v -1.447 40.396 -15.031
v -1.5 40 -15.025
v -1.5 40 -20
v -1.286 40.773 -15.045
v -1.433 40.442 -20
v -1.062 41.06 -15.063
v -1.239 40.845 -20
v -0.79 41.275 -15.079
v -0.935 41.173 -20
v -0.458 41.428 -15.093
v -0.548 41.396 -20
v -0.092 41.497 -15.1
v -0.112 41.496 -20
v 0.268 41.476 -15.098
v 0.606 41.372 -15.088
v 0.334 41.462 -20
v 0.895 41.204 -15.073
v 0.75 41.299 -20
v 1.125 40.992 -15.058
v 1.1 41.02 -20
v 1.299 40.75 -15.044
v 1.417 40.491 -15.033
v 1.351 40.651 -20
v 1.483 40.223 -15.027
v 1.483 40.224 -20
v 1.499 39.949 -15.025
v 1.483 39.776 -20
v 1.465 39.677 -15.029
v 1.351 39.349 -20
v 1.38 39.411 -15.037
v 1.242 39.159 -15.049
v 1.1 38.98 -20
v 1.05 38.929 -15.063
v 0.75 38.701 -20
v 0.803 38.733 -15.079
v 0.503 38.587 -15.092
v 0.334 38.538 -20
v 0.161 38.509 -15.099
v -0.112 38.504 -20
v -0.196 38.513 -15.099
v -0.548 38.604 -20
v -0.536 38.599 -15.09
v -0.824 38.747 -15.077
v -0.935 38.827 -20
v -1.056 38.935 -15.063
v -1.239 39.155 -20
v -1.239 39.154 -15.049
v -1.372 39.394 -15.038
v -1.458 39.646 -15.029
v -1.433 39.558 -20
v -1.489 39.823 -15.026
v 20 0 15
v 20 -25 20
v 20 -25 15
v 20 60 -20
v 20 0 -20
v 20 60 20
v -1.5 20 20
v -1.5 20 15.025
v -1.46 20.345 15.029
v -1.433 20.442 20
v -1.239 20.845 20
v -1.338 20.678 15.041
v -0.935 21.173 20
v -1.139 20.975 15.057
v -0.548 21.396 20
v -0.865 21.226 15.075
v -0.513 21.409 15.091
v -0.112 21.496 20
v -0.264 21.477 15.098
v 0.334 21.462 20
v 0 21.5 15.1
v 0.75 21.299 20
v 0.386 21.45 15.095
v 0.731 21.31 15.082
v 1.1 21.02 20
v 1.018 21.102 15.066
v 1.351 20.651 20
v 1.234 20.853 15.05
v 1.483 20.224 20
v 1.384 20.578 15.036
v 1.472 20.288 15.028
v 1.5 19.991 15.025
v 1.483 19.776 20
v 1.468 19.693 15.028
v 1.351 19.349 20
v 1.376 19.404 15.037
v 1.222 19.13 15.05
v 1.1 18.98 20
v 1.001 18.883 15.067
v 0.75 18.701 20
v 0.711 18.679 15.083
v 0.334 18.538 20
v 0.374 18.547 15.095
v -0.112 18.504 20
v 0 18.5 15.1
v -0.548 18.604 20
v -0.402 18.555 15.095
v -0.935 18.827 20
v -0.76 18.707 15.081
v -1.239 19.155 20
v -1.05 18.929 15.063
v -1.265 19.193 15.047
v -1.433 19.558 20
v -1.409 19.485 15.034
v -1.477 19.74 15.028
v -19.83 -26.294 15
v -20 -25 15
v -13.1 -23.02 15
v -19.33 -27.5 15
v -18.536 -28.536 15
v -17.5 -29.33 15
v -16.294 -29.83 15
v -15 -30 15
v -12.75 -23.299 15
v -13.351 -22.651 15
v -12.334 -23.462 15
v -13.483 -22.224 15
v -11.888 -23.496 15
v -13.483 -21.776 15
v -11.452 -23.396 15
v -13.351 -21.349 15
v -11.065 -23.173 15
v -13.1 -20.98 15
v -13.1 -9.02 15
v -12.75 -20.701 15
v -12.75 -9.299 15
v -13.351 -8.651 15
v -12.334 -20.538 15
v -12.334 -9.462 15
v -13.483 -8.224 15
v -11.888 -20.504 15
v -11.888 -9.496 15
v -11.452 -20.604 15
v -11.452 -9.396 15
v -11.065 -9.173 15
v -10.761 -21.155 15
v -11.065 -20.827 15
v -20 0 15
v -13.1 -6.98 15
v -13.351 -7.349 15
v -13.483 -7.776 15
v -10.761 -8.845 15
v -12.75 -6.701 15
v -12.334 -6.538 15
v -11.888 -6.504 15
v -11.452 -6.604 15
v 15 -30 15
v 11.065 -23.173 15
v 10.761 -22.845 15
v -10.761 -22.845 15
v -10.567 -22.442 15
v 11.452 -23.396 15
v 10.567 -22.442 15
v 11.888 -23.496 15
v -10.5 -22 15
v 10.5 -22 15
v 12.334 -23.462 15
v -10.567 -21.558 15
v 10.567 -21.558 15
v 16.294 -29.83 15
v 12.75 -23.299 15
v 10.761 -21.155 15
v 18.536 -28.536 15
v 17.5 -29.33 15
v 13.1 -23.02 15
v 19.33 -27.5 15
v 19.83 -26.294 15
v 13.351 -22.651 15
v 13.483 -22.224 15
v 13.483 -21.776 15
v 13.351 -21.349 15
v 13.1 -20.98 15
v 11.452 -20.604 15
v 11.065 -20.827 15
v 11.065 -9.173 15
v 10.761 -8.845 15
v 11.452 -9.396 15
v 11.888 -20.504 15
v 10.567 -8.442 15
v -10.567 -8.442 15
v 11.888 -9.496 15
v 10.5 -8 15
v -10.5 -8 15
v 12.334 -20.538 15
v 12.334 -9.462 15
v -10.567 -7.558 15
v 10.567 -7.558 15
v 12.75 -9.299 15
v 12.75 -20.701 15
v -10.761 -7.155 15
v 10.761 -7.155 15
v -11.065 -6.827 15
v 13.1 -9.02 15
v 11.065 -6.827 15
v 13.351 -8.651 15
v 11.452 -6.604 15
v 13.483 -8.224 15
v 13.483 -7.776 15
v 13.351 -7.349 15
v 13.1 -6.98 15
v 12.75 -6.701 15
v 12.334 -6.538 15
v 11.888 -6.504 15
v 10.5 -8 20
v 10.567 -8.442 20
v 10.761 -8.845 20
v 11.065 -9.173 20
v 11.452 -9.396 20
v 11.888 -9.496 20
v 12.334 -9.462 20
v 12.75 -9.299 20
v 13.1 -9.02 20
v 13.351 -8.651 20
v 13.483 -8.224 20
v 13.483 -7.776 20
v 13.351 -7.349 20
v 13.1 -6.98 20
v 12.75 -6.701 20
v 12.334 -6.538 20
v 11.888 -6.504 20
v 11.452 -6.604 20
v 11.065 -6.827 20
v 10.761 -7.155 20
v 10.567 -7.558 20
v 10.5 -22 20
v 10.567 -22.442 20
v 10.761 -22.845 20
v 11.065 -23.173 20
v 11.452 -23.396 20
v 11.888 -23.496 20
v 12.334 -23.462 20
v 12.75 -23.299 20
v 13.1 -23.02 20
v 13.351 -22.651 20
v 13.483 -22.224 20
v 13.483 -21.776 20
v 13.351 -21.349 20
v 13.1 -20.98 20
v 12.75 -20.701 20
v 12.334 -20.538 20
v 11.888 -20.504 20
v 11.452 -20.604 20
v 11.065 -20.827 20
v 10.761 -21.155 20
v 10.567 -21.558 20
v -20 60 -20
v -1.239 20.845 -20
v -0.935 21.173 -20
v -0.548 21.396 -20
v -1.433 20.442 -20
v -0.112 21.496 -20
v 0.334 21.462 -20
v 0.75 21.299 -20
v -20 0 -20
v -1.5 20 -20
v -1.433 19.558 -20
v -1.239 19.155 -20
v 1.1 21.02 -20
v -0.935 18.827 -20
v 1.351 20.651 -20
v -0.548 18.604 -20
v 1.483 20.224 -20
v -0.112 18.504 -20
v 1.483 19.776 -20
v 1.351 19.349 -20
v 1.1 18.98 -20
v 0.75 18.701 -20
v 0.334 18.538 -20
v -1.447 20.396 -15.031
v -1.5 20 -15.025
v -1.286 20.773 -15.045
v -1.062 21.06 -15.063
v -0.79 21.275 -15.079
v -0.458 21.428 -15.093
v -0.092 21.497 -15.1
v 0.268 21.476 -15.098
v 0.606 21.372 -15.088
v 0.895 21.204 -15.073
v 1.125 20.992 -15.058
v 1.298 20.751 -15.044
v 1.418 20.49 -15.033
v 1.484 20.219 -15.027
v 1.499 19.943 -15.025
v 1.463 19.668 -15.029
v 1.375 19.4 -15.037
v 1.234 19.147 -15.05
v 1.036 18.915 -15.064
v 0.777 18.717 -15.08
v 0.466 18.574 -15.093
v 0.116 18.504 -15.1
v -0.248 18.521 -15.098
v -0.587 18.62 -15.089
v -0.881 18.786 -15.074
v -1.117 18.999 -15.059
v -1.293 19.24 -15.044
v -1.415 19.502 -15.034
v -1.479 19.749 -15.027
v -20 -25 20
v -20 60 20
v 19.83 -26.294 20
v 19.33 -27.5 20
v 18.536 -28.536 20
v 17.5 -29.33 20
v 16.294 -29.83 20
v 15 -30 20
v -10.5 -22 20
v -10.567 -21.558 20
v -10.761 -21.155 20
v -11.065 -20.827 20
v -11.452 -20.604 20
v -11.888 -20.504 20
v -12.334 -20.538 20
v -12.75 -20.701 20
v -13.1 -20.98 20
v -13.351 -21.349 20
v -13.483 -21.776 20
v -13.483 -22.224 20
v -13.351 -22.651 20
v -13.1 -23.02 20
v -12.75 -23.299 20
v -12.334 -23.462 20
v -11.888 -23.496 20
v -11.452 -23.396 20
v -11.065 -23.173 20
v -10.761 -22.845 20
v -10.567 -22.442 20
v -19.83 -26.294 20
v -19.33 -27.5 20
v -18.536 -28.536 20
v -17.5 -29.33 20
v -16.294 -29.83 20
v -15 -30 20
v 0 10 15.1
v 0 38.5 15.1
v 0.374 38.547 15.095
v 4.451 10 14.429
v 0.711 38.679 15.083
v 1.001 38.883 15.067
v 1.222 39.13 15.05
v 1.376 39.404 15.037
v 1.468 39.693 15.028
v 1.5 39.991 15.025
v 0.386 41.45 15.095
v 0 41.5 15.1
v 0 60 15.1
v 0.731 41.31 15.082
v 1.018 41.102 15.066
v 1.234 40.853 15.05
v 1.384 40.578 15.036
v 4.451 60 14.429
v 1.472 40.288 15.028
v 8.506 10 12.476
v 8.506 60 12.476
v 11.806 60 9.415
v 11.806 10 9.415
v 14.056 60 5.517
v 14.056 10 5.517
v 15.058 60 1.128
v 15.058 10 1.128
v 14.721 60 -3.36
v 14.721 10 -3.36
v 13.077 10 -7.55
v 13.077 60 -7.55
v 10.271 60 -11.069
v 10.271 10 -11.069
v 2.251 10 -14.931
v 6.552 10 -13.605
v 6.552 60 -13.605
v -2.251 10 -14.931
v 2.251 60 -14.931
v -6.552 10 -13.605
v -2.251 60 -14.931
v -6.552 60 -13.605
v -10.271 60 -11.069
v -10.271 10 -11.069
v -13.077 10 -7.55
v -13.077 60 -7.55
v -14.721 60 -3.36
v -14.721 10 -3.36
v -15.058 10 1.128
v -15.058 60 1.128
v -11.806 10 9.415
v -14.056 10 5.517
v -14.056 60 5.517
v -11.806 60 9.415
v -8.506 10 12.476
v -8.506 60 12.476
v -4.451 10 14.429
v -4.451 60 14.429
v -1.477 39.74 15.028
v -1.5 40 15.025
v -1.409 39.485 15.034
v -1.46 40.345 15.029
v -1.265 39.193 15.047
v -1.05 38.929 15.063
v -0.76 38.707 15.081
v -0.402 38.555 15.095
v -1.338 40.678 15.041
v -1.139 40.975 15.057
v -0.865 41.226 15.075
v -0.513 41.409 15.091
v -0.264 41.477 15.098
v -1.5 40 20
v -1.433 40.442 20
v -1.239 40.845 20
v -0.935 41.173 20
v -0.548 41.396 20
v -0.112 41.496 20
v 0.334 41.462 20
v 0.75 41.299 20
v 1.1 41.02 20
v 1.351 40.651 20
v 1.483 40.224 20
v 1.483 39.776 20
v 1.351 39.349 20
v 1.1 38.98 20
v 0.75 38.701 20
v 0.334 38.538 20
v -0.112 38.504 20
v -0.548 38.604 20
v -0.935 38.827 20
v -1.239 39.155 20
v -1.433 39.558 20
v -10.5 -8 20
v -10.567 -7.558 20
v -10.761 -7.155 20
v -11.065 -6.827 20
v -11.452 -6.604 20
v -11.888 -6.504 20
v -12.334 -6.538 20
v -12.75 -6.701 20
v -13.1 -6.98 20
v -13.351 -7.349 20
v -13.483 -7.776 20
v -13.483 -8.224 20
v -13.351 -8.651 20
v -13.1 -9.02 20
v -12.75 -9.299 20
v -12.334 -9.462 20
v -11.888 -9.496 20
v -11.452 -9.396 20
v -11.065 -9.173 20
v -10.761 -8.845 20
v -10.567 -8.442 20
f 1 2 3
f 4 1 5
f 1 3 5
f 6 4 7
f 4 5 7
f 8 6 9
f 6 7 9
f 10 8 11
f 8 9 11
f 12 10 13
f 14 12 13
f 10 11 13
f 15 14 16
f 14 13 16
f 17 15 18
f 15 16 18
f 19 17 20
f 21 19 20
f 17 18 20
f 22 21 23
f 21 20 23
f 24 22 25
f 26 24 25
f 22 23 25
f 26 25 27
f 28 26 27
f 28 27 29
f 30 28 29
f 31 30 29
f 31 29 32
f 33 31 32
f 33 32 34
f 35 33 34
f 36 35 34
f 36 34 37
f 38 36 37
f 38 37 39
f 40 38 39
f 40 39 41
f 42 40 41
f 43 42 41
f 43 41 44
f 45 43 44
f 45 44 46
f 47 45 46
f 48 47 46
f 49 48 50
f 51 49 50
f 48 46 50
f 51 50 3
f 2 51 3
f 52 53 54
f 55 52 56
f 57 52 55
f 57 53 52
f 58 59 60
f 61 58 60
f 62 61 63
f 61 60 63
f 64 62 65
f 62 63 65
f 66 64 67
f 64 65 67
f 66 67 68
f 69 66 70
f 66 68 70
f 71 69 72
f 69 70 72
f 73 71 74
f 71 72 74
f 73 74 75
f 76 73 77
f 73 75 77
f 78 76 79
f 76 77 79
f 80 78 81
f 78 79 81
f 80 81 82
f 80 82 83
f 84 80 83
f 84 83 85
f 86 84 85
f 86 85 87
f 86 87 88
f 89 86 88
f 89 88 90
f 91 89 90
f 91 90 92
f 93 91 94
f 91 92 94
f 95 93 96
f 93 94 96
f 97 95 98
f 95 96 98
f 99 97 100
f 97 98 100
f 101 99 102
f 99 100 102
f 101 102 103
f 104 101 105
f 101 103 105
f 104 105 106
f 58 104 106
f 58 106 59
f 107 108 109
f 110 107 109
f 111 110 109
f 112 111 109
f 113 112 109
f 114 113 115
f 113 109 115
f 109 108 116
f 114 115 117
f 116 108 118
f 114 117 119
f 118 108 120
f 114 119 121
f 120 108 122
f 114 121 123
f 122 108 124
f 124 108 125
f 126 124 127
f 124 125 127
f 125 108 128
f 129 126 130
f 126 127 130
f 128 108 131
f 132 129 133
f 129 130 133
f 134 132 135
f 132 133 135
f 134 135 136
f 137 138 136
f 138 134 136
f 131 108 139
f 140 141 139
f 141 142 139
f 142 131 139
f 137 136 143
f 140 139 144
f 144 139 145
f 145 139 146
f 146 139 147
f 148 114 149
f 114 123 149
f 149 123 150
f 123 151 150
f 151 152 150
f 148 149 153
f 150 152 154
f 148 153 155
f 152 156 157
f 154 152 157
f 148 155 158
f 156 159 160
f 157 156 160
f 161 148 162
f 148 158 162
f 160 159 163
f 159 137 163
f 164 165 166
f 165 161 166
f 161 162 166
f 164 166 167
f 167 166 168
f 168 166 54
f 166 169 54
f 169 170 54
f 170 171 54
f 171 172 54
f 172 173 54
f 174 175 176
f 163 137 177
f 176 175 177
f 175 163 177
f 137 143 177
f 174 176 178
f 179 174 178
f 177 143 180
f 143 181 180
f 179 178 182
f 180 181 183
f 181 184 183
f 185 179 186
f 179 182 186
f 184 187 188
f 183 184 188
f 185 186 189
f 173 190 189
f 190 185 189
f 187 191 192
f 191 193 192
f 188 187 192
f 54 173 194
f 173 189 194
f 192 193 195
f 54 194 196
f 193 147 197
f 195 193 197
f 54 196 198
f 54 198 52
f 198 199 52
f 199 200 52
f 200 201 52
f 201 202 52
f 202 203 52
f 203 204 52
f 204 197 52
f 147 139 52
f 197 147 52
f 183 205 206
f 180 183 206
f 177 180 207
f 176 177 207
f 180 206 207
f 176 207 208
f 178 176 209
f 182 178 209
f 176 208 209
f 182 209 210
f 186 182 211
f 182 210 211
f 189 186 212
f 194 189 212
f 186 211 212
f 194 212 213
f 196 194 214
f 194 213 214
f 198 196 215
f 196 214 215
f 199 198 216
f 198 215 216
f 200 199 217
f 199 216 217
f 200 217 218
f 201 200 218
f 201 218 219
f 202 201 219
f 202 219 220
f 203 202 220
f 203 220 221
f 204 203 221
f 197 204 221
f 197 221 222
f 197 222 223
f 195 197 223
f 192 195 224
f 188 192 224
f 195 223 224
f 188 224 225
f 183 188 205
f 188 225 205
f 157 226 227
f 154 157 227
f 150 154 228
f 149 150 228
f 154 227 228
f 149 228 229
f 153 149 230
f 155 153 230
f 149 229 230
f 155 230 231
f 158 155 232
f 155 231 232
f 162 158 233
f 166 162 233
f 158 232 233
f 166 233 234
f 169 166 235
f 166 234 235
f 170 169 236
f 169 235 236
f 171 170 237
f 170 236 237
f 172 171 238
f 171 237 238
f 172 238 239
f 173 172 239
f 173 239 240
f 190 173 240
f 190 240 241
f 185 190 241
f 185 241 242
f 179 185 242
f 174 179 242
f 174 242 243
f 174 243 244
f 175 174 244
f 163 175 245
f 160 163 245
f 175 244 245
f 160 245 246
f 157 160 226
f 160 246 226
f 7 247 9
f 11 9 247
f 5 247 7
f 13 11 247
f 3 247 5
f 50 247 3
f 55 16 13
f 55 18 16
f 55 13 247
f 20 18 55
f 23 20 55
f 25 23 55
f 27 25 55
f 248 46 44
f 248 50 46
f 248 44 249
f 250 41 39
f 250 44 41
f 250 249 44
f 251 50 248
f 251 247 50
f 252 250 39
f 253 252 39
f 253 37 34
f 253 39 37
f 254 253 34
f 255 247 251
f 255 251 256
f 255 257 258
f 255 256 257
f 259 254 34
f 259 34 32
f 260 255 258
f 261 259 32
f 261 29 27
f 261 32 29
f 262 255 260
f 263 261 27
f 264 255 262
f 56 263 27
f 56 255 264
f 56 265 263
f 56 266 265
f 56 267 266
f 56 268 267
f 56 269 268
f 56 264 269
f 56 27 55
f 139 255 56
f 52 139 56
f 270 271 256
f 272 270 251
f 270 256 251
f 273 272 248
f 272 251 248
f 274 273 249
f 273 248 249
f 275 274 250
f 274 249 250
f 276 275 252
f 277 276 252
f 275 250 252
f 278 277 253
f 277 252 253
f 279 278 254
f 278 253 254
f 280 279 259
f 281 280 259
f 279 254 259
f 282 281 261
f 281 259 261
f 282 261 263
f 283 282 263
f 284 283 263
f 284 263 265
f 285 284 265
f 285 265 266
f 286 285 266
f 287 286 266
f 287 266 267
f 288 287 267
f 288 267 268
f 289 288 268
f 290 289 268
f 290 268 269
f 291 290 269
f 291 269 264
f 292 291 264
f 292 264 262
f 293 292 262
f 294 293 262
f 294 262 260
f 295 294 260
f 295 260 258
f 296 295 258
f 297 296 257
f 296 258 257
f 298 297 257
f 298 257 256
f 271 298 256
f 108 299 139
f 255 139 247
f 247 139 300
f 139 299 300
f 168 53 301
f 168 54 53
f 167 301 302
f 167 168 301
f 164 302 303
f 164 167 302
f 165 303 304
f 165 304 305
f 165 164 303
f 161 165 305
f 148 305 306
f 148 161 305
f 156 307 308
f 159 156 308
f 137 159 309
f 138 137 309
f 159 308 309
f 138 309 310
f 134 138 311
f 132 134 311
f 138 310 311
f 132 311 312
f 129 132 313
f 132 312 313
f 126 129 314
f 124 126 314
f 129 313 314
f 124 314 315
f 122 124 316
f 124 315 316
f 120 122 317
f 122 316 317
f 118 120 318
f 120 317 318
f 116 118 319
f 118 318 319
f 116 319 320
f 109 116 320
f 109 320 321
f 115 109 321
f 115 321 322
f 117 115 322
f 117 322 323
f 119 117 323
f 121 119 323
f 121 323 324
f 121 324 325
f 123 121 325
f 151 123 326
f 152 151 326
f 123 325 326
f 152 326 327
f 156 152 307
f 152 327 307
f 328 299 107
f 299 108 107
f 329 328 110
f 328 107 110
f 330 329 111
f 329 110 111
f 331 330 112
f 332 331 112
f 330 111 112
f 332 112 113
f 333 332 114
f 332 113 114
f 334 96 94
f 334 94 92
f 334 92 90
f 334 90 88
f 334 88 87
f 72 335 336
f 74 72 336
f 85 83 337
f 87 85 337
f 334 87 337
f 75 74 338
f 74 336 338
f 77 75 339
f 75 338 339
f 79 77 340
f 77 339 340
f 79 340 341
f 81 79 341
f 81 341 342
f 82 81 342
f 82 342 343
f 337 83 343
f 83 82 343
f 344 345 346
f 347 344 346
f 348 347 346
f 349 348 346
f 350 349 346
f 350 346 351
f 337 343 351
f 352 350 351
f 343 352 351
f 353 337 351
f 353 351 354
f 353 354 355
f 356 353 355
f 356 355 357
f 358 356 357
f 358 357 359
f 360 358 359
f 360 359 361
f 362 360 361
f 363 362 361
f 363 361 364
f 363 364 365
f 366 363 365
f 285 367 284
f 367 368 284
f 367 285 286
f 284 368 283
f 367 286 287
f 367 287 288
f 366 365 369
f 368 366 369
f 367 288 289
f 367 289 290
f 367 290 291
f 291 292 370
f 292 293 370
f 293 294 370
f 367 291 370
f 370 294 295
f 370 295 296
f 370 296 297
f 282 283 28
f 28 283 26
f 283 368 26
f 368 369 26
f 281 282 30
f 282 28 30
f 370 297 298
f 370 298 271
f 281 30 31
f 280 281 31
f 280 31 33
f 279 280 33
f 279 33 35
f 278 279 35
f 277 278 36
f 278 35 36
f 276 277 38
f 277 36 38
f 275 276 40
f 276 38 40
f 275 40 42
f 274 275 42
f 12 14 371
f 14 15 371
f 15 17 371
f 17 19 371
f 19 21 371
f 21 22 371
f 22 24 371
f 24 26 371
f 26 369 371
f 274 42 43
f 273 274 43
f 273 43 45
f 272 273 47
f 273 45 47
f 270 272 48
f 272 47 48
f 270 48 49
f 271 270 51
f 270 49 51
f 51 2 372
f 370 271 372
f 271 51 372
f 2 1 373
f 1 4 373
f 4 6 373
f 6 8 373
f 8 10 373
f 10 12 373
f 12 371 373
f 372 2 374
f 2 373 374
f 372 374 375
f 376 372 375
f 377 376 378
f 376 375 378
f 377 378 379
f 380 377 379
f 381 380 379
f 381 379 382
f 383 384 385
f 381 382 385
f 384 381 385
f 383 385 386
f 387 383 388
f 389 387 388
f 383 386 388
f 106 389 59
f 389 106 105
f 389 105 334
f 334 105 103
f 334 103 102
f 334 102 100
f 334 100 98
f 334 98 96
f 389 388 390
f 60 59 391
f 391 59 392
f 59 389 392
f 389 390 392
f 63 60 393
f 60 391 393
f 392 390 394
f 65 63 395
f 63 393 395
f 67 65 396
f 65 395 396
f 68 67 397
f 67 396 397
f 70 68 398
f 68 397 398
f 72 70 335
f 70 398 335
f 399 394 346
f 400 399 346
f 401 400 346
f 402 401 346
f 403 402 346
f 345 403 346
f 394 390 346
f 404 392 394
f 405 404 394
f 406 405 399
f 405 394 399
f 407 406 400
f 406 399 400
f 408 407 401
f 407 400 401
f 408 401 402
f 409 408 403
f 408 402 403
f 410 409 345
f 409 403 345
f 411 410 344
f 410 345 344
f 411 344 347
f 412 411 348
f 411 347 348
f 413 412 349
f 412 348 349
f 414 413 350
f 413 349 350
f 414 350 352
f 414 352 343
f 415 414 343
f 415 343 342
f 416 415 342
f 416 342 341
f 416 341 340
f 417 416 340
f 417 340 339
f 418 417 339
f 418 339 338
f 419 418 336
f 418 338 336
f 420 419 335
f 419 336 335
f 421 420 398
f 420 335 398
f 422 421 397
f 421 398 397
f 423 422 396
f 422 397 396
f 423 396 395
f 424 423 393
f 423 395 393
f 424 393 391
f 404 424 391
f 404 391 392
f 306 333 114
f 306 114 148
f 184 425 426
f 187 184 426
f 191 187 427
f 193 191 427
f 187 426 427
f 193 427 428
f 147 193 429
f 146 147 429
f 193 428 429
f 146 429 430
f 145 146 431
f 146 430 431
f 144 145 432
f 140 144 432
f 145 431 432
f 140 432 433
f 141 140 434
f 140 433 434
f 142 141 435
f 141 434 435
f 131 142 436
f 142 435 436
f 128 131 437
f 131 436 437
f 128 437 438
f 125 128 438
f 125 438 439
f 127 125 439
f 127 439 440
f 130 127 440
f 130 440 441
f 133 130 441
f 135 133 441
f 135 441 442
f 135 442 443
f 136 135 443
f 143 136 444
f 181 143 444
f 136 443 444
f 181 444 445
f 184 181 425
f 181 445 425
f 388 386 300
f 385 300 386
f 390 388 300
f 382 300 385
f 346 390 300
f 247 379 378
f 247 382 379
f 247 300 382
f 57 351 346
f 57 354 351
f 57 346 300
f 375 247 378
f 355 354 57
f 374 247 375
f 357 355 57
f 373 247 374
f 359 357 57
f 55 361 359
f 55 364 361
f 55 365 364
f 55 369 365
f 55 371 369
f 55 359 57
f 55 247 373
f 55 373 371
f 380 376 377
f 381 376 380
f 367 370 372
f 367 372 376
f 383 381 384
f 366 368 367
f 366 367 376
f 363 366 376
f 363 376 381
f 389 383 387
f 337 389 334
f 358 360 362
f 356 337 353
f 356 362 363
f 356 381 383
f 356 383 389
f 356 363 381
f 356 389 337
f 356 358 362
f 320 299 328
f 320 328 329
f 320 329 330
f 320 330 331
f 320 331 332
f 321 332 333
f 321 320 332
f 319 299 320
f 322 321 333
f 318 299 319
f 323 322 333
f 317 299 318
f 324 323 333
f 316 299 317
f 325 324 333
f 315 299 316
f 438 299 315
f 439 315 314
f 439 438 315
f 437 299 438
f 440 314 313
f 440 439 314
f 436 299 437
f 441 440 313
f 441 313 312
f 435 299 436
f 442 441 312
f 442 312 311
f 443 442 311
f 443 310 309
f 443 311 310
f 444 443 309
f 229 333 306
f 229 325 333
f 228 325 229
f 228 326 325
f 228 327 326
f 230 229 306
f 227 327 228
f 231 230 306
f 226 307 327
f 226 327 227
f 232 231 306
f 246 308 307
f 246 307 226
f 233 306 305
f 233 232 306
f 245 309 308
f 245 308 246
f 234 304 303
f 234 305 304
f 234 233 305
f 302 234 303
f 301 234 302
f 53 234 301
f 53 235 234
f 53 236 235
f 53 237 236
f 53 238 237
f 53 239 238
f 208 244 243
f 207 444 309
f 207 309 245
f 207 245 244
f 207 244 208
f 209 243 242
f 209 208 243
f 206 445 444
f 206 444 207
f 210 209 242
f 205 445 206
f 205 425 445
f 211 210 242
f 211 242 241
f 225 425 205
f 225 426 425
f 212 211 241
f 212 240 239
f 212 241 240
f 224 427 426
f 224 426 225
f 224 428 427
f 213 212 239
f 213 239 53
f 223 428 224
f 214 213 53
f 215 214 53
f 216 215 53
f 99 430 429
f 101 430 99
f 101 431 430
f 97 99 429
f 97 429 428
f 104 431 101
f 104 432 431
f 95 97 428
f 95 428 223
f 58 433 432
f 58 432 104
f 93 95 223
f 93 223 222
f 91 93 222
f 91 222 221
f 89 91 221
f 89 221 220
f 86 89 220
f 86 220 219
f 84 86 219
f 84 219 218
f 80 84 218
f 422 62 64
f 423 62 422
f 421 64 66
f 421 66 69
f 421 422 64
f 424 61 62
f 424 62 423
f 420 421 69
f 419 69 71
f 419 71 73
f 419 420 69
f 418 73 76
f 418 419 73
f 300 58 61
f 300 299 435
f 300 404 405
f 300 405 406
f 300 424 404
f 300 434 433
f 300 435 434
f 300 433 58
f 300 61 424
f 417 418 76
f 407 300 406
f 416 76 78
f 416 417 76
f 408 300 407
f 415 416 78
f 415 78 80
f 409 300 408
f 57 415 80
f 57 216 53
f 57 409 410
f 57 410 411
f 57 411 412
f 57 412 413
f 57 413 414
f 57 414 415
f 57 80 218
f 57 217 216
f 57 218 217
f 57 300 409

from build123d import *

# Parameters (mm, degrees)
SKETCH_1_W             = 40
SKETCH_1_H             = 40
EXTRUDE_1_DEPTH        = 60
SKETCH_2_R             = 15.1
CUT_EXTRUDE_1_DEPTH    = 50
SKETCH_3_W             = 40
SKETCH_3_H             = 30
SKETCH_3_R             = 1.5
EXTRUDE_2_DEPTH        = 5
FILLET_1_R             = 5
SKETCH_4_R             = 1.5
CUT_EXTRUDE_2_DEPTH    = 75.833147735
PATTERN_LINEAR_1_COUNT = 2
PATTERN_LINEAR_1_PITCH = 20


with BuildPart() as part:
    # 草圖1 → 填料-伸長1 (new body)
    with BuildSketch(Plane(origin=(0, 0, 0), x_dir=(1, 0, 0), z_dir=(0, 1, 0))):
        Rectangle(SKETCH_1_W, SKETCH_1_H)
    extrude(amount=EXTRUDE_1_DEPTH)

    # 草圖2 → 除料-伸長1 (cut)
    with BuildSketch(Plane(origin=(0, 60, 0), x_dir=(1, 0, 0), z_dir=(0, 1, 0))):
        with Locations(Location((0, 0, 0), (0, 0, 270))):
            Circle(SKETCH_2_R)
    extrude(amount=-CUT_EXTRUDE_1_DEPTH, mode=Mode.SUBTRACT)

    # 草圖3 → 填料-伸長2 (add)
    with BuildSketch(Plane.XY.offset(20)):
        with Locations((0, -15)):
            Rectangle(SKETCH_3_W, SKETCH_3_H)
        with Locations((-12, -8)):
            Circle(SKETCH_3_R, mode=Mode.SUBTRACT)
        with Locations((-12, -22)):
            Circle(SKETCH_3_R, mode=Mode.SUBTRACT)
        with Locations(Location((12, -22, 0), (0, 0, 180))):
            Circle(SKETCH_3_R, mode=Mode.SUBTRACT)
        with Locations(Location((12, -8, 0), (0, 0, 180))):
            Circle(SKETCH_3_R, mode=Mode.SUBTRACT)
    extrude(amount=-EXTRUDE_2_DEPTH)

    # 圓角1
    fillet_1_edges = [part.edges().sort_by_distance(p)[0] for p in [
        (-20, -30, 17.5),
        (20, -30, 17.5),
    ]]
    fillet(fillet_1_edges, radius=FILLET_1_R)

    # 草圖4 → 除料-伸長2 (cut, through all)
    with BuildSketch(Plane(origin=(0, 0, -20), x_dir=(-1, 0, 0), z_dir=(0, 0, -1))):
        with Locations((0, 20)):
            Circle(SKETCH_4_R)
    cut_extrude_2 = extrude(amount=-CUT_EXTRUDE_2_DEPTH, mode=Mode.SUBTRACT)

    # 直線複製排列1: 除料-伸長2 ×2
    with Locations(*[(0, i * PATTERN_LINEAR_1_PITCH, 0) for i in range(1, PATTERN_LINEAR_1_COUNT)]):
        add(cut_extrude_2, mode=Mode.SUBTRACT)


solid = part.part
